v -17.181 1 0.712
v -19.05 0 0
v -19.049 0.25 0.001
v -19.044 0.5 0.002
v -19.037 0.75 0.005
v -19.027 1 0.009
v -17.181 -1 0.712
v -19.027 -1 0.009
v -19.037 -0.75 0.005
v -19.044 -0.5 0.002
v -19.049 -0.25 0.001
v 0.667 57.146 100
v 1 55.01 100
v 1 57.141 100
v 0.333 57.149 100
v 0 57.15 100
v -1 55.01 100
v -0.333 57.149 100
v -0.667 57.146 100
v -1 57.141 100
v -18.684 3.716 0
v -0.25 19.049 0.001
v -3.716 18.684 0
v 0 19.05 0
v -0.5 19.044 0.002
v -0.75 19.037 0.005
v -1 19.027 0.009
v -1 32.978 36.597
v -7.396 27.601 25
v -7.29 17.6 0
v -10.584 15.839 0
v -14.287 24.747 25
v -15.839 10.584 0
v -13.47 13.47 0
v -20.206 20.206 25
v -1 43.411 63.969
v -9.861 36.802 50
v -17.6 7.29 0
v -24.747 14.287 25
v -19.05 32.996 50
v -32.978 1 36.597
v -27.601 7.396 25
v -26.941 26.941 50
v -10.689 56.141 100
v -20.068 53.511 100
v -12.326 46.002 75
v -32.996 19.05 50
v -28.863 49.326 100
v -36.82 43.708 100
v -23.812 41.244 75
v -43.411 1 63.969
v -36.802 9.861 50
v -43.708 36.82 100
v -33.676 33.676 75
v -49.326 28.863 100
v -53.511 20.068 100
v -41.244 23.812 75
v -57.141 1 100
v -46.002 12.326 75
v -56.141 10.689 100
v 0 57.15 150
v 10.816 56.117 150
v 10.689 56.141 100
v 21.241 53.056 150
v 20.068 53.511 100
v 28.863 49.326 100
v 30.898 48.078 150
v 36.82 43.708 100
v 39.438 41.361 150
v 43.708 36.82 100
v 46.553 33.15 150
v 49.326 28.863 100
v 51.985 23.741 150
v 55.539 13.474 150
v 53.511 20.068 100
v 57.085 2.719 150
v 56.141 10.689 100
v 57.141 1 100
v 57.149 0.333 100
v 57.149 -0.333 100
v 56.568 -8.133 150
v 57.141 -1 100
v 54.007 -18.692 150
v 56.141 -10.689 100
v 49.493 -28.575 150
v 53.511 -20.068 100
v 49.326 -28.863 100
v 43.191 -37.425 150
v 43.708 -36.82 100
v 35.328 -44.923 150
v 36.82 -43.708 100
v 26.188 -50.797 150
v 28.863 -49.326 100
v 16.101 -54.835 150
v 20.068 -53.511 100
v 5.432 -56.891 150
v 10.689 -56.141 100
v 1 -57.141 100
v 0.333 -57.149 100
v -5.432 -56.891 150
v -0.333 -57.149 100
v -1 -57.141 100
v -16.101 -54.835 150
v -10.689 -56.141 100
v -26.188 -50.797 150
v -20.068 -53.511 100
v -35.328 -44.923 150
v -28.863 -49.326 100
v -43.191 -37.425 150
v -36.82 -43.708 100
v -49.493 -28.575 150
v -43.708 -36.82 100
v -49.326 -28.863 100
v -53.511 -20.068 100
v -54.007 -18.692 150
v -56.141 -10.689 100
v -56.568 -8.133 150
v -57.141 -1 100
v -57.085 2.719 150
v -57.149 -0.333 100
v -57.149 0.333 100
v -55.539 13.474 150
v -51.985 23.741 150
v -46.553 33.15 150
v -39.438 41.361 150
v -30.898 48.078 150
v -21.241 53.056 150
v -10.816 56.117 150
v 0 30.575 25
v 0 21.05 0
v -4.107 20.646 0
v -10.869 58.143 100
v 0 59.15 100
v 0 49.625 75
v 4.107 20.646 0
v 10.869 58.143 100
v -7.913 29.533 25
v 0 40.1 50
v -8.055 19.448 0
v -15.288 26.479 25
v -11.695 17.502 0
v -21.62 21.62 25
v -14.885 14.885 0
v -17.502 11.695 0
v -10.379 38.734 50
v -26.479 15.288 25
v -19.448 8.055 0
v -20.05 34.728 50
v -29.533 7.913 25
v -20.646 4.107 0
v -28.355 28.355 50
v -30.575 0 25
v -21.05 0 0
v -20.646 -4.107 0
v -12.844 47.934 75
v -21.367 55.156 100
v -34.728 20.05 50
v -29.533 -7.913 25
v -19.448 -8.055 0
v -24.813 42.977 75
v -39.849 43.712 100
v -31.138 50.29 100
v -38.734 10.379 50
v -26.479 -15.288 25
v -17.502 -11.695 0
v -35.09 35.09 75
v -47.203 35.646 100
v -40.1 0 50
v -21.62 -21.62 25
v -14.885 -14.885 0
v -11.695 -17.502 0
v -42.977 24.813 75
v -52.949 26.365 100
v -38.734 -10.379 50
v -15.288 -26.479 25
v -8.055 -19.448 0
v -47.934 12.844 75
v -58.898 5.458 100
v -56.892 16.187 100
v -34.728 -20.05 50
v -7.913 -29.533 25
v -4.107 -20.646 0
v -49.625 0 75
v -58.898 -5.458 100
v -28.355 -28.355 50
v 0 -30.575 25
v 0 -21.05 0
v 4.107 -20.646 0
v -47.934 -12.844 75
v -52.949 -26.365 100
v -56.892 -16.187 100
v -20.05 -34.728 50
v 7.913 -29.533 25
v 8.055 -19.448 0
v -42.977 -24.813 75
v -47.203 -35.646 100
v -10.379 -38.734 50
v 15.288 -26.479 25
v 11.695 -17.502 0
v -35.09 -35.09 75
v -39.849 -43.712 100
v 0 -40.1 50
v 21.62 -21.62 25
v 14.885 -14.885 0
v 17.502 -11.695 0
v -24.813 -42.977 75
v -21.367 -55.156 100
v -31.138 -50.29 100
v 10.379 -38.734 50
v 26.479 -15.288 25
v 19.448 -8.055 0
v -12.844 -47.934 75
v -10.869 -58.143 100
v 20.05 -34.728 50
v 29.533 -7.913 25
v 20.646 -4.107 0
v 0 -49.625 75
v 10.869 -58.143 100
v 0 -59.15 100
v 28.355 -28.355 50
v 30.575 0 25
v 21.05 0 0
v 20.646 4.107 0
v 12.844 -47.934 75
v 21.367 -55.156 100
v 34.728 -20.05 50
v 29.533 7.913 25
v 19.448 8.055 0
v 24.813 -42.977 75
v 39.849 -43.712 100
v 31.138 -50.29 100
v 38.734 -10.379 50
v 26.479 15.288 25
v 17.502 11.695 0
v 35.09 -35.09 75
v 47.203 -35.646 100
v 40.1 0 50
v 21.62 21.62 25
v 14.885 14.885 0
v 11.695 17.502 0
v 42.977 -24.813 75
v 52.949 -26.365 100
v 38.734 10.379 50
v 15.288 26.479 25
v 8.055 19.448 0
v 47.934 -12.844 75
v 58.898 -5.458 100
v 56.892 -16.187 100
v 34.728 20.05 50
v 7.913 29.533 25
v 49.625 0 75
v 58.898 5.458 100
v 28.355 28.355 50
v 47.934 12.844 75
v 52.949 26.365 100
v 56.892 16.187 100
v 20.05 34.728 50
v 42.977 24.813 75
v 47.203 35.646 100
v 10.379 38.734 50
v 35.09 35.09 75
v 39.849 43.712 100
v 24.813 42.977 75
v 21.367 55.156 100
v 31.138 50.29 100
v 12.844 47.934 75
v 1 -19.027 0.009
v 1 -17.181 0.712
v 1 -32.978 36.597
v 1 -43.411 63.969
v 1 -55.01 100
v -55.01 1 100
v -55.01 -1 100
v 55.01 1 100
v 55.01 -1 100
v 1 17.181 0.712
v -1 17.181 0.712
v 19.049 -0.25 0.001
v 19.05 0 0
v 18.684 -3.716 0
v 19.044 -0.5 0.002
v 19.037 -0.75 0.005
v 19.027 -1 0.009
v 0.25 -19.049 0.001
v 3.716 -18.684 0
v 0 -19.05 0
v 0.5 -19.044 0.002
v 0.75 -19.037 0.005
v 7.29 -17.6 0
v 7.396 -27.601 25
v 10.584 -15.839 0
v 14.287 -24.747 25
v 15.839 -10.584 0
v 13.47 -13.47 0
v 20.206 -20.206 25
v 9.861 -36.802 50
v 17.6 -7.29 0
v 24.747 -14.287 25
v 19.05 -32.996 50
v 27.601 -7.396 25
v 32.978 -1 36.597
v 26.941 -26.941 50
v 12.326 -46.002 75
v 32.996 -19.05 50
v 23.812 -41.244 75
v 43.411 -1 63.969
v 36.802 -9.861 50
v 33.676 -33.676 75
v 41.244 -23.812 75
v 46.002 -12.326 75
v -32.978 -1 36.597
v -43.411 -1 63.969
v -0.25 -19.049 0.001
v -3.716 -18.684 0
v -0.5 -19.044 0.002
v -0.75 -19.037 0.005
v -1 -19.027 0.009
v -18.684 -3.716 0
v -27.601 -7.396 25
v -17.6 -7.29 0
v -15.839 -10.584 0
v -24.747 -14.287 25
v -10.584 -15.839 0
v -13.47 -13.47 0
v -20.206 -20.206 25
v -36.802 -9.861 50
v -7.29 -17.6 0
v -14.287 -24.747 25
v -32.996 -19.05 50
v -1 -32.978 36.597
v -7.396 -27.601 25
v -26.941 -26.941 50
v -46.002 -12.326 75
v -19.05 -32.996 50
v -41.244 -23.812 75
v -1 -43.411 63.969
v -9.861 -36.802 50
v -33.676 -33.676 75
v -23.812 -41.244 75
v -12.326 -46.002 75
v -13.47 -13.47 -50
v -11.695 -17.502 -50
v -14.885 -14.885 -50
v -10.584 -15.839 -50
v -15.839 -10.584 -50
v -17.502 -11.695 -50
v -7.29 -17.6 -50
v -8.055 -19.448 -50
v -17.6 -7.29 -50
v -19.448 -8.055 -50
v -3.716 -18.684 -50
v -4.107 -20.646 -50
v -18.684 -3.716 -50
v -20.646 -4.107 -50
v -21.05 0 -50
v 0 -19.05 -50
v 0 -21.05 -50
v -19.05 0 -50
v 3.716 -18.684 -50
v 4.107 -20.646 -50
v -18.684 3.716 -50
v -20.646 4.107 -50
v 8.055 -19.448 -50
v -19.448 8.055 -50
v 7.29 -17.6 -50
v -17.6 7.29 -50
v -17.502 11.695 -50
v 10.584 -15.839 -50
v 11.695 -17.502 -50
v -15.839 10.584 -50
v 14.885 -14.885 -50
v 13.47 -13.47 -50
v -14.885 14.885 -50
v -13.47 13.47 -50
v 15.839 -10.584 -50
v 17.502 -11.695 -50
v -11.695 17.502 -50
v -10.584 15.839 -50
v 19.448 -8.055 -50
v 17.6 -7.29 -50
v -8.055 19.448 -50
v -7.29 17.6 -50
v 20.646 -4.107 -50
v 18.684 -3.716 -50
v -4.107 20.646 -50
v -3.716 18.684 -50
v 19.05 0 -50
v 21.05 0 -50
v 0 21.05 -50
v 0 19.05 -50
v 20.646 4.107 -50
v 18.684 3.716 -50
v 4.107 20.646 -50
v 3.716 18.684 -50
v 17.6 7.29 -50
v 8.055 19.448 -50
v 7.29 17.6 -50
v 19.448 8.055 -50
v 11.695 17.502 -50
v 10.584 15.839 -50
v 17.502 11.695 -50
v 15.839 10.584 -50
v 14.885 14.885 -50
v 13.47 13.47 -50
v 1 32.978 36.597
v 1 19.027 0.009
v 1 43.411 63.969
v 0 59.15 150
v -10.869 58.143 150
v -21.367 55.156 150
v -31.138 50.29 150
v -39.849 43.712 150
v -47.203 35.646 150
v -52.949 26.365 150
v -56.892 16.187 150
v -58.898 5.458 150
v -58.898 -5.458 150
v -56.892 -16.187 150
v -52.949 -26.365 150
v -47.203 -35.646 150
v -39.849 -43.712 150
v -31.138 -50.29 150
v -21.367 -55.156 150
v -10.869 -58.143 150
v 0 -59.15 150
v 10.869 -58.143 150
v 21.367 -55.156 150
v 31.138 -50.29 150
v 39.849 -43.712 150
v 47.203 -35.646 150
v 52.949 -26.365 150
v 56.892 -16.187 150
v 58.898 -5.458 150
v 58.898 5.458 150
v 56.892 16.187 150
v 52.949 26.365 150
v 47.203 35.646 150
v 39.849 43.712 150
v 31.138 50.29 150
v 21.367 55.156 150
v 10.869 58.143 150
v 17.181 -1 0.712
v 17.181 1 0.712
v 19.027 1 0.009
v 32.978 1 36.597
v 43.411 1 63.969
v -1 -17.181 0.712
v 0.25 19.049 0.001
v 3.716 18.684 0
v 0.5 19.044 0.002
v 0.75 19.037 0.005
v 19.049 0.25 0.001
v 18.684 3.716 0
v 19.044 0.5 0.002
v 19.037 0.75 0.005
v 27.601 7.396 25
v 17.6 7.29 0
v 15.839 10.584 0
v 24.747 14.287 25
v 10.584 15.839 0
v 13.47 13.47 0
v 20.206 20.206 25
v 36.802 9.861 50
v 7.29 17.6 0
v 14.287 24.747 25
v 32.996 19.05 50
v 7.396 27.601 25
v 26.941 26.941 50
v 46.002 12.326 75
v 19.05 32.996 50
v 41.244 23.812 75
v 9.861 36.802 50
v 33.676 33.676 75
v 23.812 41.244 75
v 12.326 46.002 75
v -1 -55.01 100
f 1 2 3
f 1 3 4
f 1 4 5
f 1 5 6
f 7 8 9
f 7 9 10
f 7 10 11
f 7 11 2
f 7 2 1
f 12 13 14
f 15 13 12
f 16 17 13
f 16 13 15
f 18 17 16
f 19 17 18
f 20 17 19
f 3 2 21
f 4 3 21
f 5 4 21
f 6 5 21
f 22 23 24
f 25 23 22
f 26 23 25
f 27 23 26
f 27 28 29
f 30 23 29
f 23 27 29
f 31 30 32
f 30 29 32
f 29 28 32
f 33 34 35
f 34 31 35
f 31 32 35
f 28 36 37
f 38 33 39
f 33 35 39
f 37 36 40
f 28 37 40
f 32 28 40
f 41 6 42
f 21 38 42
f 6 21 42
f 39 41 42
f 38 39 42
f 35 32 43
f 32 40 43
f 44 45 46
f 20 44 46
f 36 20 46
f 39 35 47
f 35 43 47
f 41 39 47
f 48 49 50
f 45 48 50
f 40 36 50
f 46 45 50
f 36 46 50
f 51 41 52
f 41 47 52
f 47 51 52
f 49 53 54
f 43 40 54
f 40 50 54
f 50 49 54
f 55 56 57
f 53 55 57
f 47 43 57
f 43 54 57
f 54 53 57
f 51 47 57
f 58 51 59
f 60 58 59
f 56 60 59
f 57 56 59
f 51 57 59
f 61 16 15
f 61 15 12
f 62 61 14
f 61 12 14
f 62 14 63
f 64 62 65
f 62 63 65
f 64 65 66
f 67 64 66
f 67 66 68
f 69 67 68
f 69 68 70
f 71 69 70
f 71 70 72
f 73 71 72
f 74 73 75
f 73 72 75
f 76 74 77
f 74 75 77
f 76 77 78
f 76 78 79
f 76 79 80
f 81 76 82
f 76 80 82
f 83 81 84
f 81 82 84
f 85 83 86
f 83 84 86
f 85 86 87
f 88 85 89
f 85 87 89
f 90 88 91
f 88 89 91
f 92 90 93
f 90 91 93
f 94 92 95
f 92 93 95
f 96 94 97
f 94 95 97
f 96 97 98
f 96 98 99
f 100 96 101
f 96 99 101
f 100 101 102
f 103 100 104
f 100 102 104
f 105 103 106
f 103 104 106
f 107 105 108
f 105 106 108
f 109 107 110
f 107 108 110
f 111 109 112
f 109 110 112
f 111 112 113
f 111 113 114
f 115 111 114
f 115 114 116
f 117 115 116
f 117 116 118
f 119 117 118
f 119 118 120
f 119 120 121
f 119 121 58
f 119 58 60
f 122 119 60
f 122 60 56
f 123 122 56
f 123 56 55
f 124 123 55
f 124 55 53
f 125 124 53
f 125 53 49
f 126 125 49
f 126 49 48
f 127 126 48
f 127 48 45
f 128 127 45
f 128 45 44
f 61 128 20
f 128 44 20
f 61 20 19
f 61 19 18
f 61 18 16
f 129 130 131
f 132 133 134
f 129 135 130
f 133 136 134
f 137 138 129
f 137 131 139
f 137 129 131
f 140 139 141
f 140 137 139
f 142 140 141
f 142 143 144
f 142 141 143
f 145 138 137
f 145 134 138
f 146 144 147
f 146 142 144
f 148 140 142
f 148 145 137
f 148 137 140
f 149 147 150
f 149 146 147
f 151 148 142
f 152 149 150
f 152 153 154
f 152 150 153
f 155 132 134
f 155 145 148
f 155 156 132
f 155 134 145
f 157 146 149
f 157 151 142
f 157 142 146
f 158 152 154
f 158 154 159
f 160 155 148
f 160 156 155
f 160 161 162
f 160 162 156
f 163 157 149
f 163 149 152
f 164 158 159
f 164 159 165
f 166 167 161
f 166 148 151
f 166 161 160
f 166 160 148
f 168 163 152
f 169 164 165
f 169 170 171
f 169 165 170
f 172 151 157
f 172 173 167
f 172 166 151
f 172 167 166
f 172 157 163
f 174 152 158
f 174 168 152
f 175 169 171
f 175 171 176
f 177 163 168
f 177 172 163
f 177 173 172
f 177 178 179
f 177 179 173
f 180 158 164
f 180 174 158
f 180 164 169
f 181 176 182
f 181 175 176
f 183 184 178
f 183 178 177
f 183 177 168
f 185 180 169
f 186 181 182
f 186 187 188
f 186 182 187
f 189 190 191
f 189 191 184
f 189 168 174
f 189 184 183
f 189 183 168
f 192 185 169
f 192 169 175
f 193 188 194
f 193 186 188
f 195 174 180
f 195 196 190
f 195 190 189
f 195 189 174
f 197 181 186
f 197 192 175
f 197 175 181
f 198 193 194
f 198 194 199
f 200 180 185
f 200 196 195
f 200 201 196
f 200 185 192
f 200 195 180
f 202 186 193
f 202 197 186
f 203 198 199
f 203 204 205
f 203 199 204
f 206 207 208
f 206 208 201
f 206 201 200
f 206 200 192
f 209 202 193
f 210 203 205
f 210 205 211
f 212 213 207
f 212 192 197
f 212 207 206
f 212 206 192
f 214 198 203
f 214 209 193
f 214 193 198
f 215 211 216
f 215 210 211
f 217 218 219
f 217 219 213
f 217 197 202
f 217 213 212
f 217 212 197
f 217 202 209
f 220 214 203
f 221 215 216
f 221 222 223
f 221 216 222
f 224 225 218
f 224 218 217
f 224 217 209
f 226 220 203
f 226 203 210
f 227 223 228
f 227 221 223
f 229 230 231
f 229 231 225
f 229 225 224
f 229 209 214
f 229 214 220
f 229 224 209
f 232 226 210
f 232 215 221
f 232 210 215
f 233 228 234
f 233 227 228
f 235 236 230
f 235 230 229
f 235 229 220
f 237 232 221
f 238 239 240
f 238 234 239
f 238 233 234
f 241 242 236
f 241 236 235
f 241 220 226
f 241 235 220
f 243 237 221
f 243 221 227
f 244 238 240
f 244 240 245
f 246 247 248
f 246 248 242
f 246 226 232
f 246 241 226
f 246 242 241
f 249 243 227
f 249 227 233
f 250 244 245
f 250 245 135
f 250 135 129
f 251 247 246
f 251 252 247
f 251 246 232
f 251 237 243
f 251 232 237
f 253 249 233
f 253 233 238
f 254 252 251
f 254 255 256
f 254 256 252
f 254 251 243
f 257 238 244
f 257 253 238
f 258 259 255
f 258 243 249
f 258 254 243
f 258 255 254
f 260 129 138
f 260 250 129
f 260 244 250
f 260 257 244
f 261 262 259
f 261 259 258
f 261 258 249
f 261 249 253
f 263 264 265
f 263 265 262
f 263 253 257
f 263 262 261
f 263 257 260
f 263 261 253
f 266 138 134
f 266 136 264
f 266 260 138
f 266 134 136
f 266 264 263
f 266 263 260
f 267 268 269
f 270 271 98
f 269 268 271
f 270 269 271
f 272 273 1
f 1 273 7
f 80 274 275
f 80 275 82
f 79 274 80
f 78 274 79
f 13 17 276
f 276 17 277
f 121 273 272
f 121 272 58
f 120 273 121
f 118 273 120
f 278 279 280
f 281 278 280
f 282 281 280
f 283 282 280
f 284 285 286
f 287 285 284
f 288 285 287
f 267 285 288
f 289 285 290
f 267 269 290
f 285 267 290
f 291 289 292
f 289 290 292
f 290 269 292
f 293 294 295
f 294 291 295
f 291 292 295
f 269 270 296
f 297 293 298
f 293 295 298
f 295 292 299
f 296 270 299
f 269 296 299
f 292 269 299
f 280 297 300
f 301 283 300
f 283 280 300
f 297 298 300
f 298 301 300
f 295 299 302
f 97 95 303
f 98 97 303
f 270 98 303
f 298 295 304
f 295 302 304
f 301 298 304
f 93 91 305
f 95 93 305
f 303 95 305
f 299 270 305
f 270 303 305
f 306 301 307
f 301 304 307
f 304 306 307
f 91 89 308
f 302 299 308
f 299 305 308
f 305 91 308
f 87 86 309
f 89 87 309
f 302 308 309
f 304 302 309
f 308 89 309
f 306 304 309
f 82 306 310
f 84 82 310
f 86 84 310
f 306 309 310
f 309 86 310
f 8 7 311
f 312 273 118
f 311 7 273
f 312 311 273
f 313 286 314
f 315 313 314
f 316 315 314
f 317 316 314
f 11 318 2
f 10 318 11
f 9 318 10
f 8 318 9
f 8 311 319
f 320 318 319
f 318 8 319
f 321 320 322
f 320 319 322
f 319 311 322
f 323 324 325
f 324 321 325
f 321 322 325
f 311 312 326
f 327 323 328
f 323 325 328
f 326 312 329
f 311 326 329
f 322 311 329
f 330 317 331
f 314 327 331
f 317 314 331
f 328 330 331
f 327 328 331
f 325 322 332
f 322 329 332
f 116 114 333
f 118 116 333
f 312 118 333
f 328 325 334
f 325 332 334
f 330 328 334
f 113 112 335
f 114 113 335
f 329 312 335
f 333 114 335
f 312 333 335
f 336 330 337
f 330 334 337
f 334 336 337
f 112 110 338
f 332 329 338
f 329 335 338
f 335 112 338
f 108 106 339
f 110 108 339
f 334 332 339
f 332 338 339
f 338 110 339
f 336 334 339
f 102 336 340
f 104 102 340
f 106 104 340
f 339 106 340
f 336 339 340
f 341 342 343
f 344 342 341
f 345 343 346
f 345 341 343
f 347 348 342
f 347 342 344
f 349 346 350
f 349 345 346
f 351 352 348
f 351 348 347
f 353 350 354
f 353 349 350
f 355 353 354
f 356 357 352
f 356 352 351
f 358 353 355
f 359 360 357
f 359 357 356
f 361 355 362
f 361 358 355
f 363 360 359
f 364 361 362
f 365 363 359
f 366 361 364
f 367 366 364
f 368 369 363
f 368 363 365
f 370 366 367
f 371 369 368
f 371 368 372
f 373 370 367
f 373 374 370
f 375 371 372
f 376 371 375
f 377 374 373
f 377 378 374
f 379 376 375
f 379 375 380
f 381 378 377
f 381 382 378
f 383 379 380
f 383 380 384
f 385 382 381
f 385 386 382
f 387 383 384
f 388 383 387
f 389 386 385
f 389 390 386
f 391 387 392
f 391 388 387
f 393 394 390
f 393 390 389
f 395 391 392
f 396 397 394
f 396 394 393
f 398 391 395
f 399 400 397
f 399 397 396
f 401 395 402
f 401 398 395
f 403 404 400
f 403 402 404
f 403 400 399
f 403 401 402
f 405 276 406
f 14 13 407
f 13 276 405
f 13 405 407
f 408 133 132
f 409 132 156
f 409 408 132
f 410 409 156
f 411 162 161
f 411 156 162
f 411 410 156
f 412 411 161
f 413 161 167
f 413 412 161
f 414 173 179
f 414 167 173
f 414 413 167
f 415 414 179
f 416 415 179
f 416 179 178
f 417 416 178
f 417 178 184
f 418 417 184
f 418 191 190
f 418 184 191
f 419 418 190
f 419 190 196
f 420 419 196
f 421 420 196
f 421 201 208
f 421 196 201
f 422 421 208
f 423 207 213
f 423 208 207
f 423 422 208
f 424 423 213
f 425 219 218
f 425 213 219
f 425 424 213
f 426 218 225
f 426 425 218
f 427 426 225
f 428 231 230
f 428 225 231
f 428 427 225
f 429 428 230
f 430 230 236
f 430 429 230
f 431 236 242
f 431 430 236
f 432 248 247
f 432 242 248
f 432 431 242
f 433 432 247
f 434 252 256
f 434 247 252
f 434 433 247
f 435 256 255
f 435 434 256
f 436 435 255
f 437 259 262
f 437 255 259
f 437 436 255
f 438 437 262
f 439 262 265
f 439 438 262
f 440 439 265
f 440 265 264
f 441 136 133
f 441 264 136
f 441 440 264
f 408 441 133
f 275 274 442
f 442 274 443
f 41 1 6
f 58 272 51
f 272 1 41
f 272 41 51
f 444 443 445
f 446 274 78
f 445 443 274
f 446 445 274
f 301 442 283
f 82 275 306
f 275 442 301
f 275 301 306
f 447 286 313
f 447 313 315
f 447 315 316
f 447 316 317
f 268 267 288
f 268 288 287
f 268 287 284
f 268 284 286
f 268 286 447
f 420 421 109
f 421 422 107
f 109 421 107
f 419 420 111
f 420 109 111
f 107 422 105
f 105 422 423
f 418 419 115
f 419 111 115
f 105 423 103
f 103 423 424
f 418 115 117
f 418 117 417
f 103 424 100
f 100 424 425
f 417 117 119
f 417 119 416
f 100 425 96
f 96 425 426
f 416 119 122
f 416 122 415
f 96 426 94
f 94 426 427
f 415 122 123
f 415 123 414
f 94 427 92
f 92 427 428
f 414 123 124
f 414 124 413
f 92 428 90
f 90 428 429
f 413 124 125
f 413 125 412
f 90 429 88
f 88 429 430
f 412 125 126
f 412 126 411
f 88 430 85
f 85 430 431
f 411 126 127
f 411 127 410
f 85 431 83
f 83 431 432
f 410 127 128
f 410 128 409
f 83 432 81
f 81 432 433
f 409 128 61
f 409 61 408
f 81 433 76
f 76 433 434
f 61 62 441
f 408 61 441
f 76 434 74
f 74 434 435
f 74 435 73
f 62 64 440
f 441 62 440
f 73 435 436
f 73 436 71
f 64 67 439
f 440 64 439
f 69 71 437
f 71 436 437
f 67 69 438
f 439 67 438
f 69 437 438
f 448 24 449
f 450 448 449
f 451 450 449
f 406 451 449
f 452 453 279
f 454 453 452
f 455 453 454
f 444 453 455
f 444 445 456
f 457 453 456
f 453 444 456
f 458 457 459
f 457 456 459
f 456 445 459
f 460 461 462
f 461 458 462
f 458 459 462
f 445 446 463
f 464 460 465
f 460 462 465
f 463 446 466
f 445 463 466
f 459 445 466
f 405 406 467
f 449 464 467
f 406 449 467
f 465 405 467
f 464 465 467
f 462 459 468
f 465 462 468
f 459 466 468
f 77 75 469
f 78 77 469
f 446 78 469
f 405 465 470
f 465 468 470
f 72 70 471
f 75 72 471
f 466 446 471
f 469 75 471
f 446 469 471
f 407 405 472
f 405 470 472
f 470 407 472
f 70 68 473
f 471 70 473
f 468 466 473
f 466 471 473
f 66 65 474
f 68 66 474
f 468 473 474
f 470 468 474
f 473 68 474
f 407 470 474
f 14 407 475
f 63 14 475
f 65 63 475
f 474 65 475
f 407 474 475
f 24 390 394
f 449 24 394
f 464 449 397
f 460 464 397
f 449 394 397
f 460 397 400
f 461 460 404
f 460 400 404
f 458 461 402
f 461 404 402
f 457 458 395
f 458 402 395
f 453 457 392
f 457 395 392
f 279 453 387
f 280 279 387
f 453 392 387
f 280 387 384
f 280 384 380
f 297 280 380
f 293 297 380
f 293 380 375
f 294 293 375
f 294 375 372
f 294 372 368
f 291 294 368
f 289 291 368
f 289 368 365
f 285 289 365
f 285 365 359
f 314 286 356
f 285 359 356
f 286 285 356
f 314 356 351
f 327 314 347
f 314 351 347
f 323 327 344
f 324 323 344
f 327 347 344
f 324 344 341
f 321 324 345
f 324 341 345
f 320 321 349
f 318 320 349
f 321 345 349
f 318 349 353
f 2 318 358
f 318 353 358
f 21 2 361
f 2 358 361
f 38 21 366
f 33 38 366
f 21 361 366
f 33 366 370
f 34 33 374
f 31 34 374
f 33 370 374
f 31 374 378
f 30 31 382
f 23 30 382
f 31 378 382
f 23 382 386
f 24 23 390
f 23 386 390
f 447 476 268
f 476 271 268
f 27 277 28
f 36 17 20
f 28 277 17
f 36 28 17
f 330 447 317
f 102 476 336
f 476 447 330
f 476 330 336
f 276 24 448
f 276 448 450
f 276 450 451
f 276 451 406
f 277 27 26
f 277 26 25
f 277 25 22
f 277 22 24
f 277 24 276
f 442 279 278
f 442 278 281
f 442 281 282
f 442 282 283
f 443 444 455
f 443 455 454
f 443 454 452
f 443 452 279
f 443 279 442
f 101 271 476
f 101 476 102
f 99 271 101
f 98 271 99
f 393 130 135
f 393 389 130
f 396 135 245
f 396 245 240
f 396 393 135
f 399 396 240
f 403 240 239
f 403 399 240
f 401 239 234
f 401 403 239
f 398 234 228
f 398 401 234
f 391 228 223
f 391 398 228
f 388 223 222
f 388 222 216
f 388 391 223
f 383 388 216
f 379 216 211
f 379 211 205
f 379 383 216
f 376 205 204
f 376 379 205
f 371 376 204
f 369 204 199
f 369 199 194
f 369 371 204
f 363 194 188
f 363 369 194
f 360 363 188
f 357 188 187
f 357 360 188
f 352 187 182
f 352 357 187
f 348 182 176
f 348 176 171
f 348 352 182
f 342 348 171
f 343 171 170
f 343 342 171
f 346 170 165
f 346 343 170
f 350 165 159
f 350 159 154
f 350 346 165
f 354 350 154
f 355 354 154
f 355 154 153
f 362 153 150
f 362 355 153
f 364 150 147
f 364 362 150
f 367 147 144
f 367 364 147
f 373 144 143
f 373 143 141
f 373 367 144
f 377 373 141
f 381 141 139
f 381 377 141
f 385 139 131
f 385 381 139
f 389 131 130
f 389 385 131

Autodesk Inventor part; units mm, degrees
ref_plane "YZ Plane" through (0, 0, 0) normal (1, 0, 0) x (0, 1, 0)
ref_plane "XZ Plane" through (0, 0, 0) normal (0, 1, 0) x (-1, 0, 0)
ref_plane "XY Plane" through (0, 0, 0) normal (0, 0, 1) x (1, 0, 0)
sketch "Sketch1" plane through (0, 0, 0) normal (1, 0, 0) x (0, 1, 0)
  line L0 (0, 0) -> (19.05, 0)
  line L1 (19.05, 0) -> (57.15, 100)
  line L2 (57.15, 100) -> (0, 100)
  line L3 (0, 100) -> (0, 0)
  line L4 (0, 0) -> (21.05, 0)
  line L5 (0, 100) -> (59.15, 100)
  line L6 (59.15, 100) -> (21.05, 0)
  line L7 (19.05, 0) -> (19.05, -50)
  line L8 (21.05, 0) -> (21.05, -50)
  line L9 (21.05, -50) -> (19.05, -50)
  line L10 (59.15, 100) -> (59.15, 150)
  line L11 (59.15, 150) -> (57.15, 150)
  line L12 (57.15, 150) -> (57.15, 100)
  dimension "d0" = 19.05
  dimension "d1" = 100
  dimension "d2" = 57.15
  dimension "d3" = 21.05
  dimension "d4" = 59.15
  dimension "d5" = 50
  dimension "d6" = 50
revolve "Revolution1" add sketch "Sketch1" angle 360 about axis through (0, 0, 100) along (0, 0, -1) contours L1 L5 L6 L4 | L4 L8 L9 L7 | L12 L11 L10 L5
sketch "Sketch2" plane through (0, 0, 0) normal (1, 0, 0) x (0, 1, 0)
  line L0 (19.05, 0) -> (57.15, 100) projected
  line L1 (59.15, 100) -> (21.05, 0) projected
  line L2 (57.15, 100) -> (19.05, 0) construction
  line L3 (55.2811, 100.7121) -> (17.1811, 0.7121)
  line L4 (20.9189, -0.7121) -> (59.0189, 99.2879)
  arc A0 (59.0189, 99.2879) -> (55.2811, 100.7121) centre (57.15, 100) ccw
  arc A1 (17.1811, 0.7121) -> (20.9189, -0.7121) centre (19.05, 0) ccw
  line L5 (-57.15, 100) -> (57.15, 100) projected
  line L6 (57.15, 100) -> (55.2811, 100.7121)
  line L7 (-19.05, 0) -> (19.05, 0) projected
  line L8 (19.05, 0) -> (17.1811, 0.7121)
  point P0 (0, 0)
  point P1 (38.1, 50)
  point P2 (55.0098, 100)
  dimension "d8" = 4
extrude "Extrusion1" add sketch "Sketch2" along normal mid plane 2 contours L8 L3 L5 L0
pattern_circular "Circular Pattern1" count 4 over 360 about axis through (0, 0, 125) along (0, 0, -1) of "Extrusion1"
properties part number "4.5 to 1.5 inch reducer"
